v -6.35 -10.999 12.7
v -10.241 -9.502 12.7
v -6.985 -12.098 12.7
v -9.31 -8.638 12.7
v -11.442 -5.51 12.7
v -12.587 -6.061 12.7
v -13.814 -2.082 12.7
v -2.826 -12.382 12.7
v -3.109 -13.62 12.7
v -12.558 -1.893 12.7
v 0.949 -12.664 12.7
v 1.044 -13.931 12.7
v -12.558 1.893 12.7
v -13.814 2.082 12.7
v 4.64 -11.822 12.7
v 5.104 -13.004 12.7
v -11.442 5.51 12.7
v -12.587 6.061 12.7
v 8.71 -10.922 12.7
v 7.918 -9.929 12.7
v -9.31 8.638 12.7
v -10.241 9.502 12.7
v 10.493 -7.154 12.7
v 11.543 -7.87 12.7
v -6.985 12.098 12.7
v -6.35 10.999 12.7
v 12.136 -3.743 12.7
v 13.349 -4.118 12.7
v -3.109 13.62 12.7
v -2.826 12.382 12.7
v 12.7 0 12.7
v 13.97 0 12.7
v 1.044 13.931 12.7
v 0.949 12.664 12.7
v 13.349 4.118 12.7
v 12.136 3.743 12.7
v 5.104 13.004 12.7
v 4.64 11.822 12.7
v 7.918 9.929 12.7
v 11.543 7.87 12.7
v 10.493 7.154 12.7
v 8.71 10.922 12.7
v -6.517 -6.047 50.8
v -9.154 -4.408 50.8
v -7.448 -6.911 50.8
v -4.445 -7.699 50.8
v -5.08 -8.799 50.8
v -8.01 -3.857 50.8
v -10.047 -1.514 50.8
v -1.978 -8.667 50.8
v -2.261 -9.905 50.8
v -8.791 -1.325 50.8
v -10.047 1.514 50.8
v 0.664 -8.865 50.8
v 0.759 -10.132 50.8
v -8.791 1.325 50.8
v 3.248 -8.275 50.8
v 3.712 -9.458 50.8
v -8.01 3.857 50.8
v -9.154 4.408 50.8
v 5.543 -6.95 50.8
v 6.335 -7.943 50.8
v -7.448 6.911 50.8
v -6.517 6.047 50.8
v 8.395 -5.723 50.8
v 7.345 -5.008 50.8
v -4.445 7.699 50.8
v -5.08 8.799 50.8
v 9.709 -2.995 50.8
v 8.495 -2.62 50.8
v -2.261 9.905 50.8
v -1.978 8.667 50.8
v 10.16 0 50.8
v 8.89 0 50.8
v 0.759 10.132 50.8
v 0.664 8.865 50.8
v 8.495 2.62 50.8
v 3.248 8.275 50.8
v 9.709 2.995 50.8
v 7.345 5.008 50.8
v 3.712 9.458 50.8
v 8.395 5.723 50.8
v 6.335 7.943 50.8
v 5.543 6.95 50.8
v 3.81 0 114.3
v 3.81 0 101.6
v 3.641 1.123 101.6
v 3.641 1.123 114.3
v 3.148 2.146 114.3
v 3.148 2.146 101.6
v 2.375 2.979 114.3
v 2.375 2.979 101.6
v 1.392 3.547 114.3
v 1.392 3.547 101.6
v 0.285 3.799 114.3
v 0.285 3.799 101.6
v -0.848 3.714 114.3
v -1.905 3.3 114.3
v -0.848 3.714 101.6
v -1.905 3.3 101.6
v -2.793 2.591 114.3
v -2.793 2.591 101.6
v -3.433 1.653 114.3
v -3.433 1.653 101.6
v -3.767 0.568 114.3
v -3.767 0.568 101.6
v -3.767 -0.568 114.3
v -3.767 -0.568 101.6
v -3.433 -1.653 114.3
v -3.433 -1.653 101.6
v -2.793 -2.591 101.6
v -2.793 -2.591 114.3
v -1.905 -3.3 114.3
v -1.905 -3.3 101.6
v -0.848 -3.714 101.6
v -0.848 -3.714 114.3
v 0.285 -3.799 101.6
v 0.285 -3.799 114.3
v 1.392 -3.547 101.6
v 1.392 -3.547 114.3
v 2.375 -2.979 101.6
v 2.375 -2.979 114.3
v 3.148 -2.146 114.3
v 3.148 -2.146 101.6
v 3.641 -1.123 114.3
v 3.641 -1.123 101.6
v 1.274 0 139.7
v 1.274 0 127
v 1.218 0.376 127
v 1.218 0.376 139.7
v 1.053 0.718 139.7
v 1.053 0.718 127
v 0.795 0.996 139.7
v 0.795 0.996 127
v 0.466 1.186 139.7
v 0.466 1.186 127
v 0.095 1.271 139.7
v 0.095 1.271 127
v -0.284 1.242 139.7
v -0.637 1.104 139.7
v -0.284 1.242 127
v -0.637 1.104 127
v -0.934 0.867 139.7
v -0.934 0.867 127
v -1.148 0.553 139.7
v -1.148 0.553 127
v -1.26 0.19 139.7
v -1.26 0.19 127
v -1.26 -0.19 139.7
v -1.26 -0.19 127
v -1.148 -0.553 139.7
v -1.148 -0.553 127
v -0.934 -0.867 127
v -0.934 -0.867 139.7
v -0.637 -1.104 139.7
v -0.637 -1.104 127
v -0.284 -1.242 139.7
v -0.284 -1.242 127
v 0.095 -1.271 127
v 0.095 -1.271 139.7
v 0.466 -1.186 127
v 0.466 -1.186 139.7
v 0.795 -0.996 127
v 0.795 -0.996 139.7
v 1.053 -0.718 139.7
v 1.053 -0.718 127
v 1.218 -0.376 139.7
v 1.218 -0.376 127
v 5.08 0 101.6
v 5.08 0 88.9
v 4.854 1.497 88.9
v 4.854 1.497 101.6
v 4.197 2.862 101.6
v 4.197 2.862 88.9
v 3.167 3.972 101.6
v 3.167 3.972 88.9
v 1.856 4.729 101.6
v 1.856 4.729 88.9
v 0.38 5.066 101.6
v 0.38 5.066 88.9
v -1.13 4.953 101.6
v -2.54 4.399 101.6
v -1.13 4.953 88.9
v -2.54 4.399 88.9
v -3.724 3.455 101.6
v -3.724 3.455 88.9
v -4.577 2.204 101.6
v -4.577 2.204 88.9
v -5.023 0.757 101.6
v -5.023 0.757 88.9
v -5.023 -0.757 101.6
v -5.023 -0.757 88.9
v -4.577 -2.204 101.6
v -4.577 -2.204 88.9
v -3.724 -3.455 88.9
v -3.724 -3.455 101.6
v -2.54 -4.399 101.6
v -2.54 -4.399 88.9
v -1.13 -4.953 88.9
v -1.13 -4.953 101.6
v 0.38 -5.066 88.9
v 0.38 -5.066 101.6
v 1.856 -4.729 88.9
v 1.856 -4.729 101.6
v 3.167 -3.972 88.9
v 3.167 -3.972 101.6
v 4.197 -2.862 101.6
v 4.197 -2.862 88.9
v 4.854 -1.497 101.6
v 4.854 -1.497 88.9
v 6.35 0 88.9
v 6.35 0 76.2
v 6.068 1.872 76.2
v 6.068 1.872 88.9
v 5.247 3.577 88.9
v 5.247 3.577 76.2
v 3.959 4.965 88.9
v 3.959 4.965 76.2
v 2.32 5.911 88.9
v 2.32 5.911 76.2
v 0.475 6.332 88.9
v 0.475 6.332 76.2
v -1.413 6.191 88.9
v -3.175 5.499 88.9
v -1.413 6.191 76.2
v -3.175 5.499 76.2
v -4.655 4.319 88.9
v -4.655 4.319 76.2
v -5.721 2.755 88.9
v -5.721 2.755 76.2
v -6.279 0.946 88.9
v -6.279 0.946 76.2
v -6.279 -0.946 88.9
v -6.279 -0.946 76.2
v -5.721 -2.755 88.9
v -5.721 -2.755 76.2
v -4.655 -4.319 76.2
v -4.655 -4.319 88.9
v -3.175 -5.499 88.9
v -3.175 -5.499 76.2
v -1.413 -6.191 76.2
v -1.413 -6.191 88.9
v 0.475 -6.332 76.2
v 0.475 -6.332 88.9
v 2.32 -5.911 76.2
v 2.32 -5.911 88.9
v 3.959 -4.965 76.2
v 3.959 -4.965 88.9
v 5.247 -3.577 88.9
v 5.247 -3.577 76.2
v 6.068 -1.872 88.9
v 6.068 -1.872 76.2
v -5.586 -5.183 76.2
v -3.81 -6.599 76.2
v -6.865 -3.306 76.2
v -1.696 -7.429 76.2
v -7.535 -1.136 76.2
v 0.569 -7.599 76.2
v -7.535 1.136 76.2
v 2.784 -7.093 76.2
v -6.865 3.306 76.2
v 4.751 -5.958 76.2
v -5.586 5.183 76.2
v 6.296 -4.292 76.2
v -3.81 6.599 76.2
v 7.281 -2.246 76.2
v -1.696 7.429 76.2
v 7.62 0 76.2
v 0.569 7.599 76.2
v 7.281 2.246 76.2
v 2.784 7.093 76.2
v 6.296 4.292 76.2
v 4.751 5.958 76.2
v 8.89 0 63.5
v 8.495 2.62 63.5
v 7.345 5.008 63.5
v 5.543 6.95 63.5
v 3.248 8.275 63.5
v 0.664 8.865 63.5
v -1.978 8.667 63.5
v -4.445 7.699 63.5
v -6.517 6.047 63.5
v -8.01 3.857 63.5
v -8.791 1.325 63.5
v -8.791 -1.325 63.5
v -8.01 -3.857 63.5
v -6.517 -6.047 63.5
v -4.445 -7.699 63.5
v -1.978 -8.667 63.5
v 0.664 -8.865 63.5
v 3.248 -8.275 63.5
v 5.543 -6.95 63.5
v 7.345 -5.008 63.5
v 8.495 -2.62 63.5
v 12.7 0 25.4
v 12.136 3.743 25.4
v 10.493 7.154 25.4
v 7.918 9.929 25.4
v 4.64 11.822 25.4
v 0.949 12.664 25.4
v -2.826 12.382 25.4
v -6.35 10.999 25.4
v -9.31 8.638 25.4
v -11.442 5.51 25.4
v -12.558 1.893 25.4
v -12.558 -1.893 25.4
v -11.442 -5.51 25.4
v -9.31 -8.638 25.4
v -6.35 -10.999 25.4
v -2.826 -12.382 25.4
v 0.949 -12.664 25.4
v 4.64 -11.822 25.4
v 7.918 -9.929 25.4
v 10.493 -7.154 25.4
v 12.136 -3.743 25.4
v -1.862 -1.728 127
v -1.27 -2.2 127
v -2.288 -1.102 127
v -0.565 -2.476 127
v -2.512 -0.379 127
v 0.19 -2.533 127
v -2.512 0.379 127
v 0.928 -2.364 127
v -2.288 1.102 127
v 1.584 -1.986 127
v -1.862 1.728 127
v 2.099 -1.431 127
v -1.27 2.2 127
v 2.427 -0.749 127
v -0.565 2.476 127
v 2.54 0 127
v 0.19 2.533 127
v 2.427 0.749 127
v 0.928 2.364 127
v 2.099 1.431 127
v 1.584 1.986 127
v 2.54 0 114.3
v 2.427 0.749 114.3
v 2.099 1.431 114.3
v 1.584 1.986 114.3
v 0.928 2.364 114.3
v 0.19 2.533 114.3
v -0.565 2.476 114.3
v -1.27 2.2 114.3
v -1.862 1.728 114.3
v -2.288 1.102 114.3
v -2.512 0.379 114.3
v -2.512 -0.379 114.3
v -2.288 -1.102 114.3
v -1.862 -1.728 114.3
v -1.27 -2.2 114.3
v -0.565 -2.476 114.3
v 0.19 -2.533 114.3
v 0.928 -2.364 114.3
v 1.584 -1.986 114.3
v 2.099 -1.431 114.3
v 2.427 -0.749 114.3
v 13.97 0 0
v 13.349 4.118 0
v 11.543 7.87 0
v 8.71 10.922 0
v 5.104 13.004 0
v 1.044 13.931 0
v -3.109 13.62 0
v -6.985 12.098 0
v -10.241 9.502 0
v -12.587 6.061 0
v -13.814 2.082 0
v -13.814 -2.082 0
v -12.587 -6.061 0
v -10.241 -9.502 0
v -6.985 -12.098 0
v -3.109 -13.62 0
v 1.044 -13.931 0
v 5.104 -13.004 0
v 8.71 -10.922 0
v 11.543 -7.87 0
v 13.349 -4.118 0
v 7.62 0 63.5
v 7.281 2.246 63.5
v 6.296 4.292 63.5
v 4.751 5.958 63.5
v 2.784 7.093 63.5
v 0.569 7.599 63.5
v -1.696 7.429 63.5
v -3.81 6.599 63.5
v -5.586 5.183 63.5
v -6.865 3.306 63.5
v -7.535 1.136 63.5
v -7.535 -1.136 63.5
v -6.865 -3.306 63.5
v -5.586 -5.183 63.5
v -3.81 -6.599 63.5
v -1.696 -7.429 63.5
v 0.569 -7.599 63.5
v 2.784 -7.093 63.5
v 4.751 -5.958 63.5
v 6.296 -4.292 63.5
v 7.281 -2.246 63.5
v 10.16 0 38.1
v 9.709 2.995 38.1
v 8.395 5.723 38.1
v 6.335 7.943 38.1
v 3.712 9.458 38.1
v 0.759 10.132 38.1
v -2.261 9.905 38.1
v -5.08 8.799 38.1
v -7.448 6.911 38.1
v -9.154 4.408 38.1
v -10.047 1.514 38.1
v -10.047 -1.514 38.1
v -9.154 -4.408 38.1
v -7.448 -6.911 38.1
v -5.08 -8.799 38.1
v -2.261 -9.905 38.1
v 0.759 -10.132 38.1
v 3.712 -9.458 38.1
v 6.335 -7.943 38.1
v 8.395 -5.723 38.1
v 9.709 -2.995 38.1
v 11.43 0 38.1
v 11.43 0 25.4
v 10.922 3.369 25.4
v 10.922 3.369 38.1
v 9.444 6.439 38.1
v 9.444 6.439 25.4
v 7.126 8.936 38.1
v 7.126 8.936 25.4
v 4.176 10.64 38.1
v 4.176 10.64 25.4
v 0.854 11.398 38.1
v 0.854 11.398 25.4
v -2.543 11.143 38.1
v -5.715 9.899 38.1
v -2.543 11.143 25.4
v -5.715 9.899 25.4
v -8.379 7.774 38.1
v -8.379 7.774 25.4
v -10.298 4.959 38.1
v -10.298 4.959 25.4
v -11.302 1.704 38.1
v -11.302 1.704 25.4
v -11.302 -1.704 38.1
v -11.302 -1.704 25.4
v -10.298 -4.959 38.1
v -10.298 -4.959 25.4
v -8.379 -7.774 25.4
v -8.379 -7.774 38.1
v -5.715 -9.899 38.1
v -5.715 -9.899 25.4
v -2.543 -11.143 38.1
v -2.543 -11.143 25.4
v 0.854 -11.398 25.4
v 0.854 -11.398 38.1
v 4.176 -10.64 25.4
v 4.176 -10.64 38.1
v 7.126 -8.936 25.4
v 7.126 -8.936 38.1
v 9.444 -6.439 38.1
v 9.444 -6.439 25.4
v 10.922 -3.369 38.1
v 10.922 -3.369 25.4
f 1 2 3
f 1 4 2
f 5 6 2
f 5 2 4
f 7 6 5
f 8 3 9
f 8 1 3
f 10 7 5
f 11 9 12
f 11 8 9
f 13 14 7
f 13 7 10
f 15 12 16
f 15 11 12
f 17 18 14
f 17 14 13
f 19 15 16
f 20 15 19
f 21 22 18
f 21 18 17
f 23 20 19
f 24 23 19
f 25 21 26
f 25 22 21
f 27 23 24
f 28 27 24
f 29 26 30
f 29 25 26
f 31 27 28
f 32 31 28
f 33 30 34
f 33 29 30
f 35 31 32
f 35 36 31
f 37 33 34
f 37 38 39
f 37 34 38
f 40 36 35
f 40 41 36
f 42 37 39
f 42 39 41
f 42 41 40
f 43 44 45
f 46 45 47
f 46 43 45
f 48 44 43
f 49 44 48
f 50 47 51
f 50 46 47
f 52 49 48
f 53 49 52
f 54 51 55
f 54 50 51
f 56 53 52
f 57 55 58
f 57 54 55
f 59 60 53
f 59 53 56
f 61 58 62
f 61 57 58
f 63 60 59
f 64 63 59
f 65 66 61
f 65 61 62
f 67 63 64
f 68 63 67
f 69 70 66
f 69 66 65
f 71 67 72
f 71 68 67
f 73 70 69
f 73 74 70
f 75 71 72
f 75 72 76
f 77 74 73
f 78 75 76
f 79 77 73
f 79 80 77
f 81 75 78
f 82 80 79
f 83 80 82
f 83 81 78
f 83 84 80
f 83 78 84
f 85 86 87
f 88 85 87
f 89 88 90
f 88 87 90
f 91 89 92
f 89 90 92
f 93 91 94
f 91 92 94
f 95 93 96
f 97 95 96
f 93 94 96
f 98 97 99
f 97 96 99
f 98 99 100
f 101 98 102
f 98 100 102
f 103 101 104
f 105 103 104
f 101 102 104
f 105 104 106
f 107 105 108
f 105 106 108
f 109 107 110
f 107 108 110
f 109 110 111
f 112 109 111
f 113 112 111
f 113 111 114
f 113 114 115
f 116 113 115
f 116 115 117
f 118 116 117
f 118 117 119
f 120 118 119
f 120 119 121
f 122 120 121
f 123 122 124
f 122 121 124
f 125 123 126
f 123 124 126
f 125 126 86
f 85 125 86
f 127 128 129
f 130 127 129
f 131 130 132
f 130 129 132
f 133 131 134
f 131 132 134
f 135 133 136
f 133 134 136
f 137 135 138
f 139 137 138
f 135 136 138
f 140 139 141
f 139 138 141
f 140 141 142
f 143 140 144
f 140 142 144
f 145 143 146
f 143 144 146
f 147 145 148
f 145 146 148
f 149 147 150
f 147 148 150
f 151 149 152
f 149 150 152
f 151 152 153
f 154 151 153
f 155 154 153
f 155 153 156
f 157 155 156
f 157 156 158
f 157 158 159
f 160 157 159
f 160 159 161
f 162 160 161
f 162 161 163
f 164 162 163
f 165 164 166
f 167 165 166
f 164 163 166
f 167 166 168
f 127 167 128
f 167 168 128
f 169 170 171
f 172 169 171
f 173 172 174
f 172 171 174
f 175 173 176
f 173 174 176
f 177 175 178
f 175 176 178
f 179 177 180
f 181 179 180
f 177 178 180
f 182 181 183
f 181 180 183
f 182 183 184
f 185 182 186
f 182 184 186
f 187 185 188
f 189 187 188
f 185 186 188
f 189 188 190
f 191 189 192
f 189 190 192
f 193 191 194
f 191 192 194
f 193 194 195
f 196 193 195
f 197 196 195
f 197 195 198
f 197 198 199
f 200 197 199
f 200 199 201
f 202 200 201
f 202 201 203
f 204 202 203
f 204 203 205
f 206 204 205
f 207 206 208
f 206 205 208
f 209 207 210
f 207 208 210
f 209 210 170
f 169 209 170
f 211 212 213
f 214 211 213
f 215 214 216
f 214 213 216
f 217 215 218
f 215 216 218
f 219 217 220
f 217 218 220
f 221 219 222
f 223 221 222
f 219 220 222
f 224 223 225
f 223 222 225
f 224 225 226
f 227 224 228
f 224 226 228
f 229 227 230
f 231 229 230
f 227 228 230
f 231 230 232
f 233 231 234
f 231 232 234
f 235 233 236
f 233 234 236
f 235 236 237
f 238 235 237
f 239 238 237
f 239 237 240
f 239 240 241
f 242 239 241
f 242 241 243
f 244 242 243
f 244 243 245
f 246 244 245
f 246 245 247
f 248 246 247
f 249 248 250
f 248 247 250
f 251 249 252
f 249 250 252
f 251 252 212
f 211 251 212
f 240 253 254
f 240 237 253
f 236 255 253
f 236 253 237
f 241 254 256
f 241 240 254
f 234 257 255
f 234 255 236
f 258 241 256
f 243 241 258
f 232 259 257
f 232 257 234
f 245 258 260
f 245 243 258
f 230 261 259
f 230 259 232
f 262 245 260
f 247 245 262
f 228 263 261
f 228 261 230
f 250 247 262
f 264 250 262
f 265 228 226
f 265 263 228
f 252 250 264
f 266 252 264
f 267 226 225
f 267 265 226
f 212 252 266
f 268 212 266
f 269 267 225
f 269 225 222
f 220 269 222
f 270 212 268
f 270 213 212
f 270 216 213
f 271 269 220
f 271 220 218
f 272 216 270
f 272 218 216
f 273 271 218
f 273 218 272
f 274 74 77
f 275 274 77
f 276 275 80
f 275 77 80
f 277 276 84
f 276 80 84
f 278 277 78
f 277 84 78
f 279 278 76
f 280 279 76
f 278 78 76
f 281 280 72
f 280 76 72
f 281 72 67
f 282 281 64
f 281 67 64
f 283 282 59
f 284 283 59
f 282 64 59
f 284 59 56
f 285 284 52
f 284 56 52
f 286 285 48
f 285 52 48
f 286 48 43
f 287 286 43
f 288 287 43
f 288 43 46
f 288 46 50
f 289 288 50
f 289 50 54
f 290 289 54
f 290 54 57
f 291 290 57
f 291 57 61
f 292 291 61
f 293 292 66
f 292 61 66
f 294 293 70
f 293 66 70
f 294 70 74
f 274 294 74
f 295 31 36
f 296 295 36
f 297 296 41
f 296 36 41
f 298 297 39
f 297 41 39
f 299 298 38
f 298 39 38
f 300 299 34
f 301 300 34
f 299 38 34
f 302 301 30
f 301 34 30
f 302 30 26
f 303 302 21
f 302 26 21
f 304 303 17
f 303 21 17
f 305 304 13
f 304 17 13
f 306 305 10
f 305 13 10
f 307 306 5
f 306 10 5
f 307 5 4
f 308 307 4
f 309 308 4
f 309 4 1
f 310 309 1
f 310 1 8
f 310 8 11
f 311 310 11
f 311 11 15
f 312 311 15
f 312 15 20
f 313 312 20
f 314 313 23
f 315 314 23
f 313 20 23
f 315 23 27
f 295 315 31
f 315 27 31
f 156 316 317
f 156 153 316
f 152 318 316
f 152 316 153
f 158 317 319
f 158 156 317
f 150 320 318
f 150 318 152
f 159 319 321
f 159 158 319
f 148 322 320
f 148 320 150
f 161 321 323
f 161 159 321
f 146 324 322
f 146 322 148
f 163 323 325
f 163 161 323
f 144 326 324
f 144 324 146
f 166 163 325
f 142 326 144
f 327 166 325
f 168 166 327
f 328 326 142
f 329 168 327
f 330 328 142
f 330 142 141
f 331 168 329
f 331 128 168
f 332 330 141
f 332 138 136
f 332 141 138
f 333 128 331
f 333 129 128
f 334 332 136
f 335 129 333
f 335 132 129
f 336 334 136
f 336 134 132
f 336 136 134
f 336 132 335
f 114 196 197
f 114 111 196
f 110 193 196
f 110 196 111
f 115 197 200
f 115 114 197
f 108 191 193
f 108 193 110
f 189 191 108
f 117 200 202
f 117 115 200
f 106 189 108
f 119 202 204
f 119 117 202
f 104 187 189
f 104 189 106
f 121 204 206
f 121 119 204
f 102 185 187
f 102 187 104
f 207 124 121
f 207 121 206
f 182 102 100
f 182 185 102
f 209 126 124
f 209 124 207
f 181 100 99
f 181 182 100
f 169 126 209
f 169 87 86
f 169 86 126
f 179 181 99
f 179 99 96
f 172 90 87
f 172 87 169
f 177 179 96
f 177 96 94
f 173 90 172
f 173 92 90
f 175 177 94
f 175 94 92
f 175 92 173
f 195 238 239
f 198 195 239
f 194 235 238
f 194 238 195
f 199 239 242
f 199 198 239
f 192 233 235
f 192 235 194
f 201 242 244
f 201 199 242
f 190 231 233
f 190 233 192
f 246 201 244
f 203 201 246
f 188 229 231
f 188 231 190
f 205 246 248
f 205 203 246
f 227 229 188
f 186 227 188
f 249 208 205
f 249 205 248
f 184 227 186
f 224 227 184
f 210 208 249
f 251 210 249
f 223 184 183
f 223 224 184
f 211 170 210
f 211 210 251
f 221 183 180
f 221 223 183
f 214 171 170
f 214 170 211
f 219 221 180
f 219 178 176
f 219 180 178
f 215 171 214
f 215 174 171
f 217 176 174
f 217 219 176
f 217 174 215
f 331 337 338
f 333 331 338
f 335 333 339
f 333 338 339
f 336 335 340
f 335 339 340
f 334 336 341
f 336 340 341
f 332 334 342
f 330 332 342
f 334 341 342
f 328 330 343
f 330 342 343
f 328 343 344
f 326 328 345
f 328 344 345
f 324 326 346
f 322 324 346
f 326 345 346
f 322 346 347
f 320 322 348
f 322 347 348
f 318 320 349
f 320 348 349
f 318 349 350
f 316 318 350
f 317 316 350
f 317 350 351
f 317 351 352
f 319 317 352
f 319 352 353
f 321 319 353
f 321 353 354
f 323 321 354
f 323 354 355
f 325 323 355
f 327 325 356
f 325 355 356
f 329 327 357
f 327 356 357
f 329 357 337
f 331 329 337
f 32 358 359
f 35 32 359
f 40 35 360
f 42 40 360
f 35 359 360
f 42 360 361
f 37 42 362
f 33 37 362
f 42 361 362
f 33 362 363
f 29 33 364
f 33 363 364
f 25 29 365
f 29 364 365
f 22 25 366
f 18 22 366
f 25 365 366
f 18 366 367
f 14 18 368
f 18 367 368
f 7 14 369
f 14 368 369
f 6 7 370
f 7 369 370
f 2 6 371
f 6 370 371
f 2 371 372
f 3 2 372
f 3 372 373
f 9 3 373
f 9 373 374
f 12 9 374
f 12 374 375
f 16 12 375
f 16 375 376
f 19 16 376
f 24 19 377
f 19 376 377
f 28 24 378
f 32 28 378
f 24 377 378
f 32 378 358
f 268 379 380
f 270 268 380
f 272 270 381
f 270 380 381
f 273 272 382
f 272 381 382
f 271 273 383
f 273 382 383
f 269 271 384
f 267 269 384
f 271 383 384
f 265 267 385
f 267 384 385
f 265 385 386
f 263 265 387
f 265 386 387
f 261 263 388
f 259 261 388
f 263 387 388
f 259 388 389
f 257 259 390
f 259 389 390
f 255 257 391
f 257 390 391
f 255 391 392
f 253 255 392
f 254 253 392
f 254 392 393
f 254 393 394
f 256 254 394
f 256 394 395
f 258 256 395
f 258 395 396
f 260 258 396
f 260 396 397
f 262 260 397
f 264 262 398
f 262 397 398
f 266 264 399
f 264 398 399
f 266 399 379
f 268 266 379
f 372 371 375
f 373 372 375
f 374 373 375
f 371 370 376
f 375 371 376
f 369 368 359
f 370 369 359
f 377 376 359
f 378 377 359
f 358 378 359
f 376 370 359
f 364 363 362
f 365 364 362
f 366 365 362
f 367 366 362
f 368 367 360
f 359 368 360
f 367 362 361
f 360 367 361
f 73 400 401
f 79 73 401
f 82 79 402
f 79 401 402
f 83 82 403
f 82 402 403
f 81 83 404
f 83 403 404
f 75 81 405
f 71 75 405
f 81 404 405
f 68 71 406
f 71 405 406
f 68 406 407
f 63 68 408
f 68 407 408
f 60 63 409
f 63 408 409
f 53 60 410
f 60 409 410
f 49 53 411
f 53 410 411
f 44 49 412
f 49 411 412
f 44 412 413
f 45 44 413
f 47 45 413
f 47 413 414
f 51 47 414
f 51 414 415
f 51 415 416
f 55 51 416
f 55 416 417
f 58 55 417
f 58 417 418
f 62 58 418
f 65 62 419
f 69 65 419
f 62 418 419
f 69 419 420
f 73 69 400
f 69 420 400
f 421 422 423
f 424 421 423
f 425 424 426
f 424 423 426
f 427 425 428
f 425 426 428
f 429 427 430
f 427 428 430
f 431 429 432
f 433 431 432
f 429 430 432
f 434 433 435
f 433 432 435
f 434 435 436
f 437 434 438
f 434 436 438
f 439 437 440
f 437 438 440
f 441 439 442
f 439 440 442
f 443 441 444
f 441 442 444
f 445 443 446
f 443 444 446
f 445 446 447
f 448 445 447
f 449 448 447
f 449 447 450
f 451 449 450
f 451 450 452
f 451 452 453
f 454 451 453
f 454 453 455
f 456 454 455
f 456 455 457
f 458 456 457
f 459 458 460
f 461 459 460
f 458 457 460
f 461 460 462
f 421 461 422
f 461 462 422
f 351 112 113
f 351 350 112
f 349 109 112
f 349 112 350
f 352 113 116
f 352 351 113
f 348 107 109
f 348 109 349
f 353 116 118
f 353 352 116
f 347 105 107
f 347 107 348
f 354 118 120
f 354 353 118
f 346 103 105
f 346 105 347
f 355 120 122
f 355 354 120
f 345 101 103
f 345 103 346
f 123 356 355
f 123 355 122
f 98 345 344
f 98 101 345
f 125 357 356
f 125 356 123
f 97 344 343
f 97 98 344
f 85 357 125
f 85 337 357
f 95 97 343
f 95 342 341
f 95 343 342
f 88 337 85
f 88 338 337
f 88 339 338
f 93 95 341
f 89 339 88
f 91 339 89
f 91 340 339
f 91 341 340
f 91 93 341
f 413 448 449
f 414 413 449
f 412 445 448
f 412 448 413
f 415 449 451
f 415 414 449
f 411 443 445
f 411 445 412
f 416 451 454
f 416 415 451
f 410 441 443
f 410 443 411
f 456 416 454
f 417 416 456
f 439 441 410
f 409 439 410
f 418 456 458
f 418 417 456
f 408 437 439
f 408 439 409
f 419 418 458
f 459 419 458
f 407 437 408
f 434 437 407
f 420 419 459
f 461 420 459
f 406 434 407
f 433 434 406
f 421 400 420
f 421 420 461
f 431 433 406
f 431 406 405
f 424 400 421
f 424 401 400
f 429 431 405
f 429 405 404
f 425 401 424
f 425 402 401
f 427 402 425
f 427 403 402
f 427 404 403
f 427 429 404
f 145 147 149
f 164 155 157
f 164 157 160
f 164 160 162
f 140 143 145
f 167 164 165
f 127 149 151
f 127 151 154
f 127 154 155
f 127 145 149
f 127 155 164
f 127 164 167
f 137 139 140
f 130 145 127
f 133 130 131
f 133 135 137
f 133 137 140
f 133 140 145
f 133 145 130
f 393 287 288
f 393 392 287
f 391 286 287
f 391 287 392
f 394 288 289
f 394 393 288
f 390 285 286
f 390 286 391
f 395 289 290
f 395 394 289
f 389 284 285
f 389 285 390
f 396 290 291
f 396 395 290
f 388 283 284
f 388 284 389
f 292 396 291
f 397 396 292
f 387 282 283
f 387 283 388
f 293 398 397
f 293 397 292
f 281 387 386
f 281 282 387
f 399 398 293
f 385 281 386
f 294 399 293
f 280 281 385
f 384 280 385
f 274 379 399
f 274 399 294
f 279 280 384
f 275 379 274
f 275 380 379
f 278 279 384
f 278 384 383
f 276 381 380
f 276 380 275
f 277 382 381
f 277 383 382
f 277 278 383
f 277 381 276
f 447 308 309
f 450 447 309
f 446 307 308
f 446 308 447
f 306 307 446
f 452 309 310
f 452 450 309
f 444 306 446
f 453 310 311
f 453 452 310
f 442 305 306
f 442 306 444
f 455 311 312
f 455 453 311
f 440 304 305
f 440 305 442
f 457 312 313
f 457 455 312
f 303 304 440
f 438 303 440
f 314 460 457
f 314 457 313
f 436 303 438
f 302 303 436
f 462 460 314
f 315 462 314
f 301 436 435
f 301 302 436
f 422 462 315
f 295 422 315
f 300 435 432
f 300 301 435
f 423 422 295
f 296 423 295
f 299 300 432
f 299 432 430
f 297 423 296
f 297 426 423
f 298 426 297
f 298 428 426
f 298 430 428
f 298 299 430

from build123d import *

# Parameters (mm, degrees)
F0_R      = 13.97
F1_DEPTH  = 12.7
F2_R      = 12.7
F3_DEPTH  = 12.7
F4_R      = 11.43
F5_DEPTH  = 12.7
F6_R      = 10.16
F7_DEPTH  = 12.7
F8_R      = 8.89
F9_DEPTH  = 12.7
F10_R     = 7.62
F11_DEPTH = 12.7
F12_R     = 6.35
F13_DEPTH = 12.7
F14_R     = 5.08
F15_DEPTH = 12.7
F16_R     = 3.81
F17_DEPTH = 12.7
F18_R     = 2.54
F19_DEPTH = 12.7
F20_R     = 1.274309
F21_DEPTH = 12.7


with BuildPart() as f1:
    # F0 (on Top) → F1 (new body)
    with BuildSketch(Plane.XY):
        Circle(F0_R)
    extrude(amount=F1_DEPTH)

    # F2 (on face) → F3 (join)
    with BuildSketch(Plane.XY.offset(12.7)):
        Circle(F2_R)
    extrude(amount=F3_DEPTH)

    # F4 (on face) → F5 (join)
    with BuildSketch(Plane.XY.offset(25.4)):
        Circle(F4_R)
    extrude(amount=F5_DEPTH)

    # F6 (on face) → F7 (join)
    with BuildSketch(Plane.XY.offset(38.1)):
        Circle(F6_R)
    extrude(amount=F7_DEPTH)

    # F8 (on face) → F9 (join)
    with BuildSketch(Plane.XY.offset(50.8)):
        Circle(F8_R)
    extrude(amount=F9_DEPTH)

    # F10 (on face) → F11 (join)
    with BuildSketch(Plane.XY.offset(63.5)):
        Circle(F10_R)
    extrude(amount=F11_DEPTH)

    # F12 (on face) → F13 (join)
    with BuildSketch(Plane.XY.offset(76.2)):
        Circle(F12_R)
    extrude(amount=F13_DEPTH)

    # F14 (on face) → F15 (join)
    with BuildSketch(Plane.XY.offset(88.9)):
        Circle(F14_R)
    extrude(amount=F15_DEPTH)

    # F16 (on face) → F17 (join)
    with BuildSketch(Plane.XY.offset(101.6)):
        Circle(F16_R)
    extrude(amount=F17_DEPTH)

    # F18 (on face) → F19 (join)
    with BuildSketch(Plane.XY.offset(114.3)):
        Circle(F18_R)
    extrude(amount=F19_DEPTH)

    # F20 (on face) → F21 (join)
    with BuildSketch(Plane.XY.offset(127)):
        Circle(F20_R)
    extrude(amount=F21_DEPTH)


solid = f1.part
